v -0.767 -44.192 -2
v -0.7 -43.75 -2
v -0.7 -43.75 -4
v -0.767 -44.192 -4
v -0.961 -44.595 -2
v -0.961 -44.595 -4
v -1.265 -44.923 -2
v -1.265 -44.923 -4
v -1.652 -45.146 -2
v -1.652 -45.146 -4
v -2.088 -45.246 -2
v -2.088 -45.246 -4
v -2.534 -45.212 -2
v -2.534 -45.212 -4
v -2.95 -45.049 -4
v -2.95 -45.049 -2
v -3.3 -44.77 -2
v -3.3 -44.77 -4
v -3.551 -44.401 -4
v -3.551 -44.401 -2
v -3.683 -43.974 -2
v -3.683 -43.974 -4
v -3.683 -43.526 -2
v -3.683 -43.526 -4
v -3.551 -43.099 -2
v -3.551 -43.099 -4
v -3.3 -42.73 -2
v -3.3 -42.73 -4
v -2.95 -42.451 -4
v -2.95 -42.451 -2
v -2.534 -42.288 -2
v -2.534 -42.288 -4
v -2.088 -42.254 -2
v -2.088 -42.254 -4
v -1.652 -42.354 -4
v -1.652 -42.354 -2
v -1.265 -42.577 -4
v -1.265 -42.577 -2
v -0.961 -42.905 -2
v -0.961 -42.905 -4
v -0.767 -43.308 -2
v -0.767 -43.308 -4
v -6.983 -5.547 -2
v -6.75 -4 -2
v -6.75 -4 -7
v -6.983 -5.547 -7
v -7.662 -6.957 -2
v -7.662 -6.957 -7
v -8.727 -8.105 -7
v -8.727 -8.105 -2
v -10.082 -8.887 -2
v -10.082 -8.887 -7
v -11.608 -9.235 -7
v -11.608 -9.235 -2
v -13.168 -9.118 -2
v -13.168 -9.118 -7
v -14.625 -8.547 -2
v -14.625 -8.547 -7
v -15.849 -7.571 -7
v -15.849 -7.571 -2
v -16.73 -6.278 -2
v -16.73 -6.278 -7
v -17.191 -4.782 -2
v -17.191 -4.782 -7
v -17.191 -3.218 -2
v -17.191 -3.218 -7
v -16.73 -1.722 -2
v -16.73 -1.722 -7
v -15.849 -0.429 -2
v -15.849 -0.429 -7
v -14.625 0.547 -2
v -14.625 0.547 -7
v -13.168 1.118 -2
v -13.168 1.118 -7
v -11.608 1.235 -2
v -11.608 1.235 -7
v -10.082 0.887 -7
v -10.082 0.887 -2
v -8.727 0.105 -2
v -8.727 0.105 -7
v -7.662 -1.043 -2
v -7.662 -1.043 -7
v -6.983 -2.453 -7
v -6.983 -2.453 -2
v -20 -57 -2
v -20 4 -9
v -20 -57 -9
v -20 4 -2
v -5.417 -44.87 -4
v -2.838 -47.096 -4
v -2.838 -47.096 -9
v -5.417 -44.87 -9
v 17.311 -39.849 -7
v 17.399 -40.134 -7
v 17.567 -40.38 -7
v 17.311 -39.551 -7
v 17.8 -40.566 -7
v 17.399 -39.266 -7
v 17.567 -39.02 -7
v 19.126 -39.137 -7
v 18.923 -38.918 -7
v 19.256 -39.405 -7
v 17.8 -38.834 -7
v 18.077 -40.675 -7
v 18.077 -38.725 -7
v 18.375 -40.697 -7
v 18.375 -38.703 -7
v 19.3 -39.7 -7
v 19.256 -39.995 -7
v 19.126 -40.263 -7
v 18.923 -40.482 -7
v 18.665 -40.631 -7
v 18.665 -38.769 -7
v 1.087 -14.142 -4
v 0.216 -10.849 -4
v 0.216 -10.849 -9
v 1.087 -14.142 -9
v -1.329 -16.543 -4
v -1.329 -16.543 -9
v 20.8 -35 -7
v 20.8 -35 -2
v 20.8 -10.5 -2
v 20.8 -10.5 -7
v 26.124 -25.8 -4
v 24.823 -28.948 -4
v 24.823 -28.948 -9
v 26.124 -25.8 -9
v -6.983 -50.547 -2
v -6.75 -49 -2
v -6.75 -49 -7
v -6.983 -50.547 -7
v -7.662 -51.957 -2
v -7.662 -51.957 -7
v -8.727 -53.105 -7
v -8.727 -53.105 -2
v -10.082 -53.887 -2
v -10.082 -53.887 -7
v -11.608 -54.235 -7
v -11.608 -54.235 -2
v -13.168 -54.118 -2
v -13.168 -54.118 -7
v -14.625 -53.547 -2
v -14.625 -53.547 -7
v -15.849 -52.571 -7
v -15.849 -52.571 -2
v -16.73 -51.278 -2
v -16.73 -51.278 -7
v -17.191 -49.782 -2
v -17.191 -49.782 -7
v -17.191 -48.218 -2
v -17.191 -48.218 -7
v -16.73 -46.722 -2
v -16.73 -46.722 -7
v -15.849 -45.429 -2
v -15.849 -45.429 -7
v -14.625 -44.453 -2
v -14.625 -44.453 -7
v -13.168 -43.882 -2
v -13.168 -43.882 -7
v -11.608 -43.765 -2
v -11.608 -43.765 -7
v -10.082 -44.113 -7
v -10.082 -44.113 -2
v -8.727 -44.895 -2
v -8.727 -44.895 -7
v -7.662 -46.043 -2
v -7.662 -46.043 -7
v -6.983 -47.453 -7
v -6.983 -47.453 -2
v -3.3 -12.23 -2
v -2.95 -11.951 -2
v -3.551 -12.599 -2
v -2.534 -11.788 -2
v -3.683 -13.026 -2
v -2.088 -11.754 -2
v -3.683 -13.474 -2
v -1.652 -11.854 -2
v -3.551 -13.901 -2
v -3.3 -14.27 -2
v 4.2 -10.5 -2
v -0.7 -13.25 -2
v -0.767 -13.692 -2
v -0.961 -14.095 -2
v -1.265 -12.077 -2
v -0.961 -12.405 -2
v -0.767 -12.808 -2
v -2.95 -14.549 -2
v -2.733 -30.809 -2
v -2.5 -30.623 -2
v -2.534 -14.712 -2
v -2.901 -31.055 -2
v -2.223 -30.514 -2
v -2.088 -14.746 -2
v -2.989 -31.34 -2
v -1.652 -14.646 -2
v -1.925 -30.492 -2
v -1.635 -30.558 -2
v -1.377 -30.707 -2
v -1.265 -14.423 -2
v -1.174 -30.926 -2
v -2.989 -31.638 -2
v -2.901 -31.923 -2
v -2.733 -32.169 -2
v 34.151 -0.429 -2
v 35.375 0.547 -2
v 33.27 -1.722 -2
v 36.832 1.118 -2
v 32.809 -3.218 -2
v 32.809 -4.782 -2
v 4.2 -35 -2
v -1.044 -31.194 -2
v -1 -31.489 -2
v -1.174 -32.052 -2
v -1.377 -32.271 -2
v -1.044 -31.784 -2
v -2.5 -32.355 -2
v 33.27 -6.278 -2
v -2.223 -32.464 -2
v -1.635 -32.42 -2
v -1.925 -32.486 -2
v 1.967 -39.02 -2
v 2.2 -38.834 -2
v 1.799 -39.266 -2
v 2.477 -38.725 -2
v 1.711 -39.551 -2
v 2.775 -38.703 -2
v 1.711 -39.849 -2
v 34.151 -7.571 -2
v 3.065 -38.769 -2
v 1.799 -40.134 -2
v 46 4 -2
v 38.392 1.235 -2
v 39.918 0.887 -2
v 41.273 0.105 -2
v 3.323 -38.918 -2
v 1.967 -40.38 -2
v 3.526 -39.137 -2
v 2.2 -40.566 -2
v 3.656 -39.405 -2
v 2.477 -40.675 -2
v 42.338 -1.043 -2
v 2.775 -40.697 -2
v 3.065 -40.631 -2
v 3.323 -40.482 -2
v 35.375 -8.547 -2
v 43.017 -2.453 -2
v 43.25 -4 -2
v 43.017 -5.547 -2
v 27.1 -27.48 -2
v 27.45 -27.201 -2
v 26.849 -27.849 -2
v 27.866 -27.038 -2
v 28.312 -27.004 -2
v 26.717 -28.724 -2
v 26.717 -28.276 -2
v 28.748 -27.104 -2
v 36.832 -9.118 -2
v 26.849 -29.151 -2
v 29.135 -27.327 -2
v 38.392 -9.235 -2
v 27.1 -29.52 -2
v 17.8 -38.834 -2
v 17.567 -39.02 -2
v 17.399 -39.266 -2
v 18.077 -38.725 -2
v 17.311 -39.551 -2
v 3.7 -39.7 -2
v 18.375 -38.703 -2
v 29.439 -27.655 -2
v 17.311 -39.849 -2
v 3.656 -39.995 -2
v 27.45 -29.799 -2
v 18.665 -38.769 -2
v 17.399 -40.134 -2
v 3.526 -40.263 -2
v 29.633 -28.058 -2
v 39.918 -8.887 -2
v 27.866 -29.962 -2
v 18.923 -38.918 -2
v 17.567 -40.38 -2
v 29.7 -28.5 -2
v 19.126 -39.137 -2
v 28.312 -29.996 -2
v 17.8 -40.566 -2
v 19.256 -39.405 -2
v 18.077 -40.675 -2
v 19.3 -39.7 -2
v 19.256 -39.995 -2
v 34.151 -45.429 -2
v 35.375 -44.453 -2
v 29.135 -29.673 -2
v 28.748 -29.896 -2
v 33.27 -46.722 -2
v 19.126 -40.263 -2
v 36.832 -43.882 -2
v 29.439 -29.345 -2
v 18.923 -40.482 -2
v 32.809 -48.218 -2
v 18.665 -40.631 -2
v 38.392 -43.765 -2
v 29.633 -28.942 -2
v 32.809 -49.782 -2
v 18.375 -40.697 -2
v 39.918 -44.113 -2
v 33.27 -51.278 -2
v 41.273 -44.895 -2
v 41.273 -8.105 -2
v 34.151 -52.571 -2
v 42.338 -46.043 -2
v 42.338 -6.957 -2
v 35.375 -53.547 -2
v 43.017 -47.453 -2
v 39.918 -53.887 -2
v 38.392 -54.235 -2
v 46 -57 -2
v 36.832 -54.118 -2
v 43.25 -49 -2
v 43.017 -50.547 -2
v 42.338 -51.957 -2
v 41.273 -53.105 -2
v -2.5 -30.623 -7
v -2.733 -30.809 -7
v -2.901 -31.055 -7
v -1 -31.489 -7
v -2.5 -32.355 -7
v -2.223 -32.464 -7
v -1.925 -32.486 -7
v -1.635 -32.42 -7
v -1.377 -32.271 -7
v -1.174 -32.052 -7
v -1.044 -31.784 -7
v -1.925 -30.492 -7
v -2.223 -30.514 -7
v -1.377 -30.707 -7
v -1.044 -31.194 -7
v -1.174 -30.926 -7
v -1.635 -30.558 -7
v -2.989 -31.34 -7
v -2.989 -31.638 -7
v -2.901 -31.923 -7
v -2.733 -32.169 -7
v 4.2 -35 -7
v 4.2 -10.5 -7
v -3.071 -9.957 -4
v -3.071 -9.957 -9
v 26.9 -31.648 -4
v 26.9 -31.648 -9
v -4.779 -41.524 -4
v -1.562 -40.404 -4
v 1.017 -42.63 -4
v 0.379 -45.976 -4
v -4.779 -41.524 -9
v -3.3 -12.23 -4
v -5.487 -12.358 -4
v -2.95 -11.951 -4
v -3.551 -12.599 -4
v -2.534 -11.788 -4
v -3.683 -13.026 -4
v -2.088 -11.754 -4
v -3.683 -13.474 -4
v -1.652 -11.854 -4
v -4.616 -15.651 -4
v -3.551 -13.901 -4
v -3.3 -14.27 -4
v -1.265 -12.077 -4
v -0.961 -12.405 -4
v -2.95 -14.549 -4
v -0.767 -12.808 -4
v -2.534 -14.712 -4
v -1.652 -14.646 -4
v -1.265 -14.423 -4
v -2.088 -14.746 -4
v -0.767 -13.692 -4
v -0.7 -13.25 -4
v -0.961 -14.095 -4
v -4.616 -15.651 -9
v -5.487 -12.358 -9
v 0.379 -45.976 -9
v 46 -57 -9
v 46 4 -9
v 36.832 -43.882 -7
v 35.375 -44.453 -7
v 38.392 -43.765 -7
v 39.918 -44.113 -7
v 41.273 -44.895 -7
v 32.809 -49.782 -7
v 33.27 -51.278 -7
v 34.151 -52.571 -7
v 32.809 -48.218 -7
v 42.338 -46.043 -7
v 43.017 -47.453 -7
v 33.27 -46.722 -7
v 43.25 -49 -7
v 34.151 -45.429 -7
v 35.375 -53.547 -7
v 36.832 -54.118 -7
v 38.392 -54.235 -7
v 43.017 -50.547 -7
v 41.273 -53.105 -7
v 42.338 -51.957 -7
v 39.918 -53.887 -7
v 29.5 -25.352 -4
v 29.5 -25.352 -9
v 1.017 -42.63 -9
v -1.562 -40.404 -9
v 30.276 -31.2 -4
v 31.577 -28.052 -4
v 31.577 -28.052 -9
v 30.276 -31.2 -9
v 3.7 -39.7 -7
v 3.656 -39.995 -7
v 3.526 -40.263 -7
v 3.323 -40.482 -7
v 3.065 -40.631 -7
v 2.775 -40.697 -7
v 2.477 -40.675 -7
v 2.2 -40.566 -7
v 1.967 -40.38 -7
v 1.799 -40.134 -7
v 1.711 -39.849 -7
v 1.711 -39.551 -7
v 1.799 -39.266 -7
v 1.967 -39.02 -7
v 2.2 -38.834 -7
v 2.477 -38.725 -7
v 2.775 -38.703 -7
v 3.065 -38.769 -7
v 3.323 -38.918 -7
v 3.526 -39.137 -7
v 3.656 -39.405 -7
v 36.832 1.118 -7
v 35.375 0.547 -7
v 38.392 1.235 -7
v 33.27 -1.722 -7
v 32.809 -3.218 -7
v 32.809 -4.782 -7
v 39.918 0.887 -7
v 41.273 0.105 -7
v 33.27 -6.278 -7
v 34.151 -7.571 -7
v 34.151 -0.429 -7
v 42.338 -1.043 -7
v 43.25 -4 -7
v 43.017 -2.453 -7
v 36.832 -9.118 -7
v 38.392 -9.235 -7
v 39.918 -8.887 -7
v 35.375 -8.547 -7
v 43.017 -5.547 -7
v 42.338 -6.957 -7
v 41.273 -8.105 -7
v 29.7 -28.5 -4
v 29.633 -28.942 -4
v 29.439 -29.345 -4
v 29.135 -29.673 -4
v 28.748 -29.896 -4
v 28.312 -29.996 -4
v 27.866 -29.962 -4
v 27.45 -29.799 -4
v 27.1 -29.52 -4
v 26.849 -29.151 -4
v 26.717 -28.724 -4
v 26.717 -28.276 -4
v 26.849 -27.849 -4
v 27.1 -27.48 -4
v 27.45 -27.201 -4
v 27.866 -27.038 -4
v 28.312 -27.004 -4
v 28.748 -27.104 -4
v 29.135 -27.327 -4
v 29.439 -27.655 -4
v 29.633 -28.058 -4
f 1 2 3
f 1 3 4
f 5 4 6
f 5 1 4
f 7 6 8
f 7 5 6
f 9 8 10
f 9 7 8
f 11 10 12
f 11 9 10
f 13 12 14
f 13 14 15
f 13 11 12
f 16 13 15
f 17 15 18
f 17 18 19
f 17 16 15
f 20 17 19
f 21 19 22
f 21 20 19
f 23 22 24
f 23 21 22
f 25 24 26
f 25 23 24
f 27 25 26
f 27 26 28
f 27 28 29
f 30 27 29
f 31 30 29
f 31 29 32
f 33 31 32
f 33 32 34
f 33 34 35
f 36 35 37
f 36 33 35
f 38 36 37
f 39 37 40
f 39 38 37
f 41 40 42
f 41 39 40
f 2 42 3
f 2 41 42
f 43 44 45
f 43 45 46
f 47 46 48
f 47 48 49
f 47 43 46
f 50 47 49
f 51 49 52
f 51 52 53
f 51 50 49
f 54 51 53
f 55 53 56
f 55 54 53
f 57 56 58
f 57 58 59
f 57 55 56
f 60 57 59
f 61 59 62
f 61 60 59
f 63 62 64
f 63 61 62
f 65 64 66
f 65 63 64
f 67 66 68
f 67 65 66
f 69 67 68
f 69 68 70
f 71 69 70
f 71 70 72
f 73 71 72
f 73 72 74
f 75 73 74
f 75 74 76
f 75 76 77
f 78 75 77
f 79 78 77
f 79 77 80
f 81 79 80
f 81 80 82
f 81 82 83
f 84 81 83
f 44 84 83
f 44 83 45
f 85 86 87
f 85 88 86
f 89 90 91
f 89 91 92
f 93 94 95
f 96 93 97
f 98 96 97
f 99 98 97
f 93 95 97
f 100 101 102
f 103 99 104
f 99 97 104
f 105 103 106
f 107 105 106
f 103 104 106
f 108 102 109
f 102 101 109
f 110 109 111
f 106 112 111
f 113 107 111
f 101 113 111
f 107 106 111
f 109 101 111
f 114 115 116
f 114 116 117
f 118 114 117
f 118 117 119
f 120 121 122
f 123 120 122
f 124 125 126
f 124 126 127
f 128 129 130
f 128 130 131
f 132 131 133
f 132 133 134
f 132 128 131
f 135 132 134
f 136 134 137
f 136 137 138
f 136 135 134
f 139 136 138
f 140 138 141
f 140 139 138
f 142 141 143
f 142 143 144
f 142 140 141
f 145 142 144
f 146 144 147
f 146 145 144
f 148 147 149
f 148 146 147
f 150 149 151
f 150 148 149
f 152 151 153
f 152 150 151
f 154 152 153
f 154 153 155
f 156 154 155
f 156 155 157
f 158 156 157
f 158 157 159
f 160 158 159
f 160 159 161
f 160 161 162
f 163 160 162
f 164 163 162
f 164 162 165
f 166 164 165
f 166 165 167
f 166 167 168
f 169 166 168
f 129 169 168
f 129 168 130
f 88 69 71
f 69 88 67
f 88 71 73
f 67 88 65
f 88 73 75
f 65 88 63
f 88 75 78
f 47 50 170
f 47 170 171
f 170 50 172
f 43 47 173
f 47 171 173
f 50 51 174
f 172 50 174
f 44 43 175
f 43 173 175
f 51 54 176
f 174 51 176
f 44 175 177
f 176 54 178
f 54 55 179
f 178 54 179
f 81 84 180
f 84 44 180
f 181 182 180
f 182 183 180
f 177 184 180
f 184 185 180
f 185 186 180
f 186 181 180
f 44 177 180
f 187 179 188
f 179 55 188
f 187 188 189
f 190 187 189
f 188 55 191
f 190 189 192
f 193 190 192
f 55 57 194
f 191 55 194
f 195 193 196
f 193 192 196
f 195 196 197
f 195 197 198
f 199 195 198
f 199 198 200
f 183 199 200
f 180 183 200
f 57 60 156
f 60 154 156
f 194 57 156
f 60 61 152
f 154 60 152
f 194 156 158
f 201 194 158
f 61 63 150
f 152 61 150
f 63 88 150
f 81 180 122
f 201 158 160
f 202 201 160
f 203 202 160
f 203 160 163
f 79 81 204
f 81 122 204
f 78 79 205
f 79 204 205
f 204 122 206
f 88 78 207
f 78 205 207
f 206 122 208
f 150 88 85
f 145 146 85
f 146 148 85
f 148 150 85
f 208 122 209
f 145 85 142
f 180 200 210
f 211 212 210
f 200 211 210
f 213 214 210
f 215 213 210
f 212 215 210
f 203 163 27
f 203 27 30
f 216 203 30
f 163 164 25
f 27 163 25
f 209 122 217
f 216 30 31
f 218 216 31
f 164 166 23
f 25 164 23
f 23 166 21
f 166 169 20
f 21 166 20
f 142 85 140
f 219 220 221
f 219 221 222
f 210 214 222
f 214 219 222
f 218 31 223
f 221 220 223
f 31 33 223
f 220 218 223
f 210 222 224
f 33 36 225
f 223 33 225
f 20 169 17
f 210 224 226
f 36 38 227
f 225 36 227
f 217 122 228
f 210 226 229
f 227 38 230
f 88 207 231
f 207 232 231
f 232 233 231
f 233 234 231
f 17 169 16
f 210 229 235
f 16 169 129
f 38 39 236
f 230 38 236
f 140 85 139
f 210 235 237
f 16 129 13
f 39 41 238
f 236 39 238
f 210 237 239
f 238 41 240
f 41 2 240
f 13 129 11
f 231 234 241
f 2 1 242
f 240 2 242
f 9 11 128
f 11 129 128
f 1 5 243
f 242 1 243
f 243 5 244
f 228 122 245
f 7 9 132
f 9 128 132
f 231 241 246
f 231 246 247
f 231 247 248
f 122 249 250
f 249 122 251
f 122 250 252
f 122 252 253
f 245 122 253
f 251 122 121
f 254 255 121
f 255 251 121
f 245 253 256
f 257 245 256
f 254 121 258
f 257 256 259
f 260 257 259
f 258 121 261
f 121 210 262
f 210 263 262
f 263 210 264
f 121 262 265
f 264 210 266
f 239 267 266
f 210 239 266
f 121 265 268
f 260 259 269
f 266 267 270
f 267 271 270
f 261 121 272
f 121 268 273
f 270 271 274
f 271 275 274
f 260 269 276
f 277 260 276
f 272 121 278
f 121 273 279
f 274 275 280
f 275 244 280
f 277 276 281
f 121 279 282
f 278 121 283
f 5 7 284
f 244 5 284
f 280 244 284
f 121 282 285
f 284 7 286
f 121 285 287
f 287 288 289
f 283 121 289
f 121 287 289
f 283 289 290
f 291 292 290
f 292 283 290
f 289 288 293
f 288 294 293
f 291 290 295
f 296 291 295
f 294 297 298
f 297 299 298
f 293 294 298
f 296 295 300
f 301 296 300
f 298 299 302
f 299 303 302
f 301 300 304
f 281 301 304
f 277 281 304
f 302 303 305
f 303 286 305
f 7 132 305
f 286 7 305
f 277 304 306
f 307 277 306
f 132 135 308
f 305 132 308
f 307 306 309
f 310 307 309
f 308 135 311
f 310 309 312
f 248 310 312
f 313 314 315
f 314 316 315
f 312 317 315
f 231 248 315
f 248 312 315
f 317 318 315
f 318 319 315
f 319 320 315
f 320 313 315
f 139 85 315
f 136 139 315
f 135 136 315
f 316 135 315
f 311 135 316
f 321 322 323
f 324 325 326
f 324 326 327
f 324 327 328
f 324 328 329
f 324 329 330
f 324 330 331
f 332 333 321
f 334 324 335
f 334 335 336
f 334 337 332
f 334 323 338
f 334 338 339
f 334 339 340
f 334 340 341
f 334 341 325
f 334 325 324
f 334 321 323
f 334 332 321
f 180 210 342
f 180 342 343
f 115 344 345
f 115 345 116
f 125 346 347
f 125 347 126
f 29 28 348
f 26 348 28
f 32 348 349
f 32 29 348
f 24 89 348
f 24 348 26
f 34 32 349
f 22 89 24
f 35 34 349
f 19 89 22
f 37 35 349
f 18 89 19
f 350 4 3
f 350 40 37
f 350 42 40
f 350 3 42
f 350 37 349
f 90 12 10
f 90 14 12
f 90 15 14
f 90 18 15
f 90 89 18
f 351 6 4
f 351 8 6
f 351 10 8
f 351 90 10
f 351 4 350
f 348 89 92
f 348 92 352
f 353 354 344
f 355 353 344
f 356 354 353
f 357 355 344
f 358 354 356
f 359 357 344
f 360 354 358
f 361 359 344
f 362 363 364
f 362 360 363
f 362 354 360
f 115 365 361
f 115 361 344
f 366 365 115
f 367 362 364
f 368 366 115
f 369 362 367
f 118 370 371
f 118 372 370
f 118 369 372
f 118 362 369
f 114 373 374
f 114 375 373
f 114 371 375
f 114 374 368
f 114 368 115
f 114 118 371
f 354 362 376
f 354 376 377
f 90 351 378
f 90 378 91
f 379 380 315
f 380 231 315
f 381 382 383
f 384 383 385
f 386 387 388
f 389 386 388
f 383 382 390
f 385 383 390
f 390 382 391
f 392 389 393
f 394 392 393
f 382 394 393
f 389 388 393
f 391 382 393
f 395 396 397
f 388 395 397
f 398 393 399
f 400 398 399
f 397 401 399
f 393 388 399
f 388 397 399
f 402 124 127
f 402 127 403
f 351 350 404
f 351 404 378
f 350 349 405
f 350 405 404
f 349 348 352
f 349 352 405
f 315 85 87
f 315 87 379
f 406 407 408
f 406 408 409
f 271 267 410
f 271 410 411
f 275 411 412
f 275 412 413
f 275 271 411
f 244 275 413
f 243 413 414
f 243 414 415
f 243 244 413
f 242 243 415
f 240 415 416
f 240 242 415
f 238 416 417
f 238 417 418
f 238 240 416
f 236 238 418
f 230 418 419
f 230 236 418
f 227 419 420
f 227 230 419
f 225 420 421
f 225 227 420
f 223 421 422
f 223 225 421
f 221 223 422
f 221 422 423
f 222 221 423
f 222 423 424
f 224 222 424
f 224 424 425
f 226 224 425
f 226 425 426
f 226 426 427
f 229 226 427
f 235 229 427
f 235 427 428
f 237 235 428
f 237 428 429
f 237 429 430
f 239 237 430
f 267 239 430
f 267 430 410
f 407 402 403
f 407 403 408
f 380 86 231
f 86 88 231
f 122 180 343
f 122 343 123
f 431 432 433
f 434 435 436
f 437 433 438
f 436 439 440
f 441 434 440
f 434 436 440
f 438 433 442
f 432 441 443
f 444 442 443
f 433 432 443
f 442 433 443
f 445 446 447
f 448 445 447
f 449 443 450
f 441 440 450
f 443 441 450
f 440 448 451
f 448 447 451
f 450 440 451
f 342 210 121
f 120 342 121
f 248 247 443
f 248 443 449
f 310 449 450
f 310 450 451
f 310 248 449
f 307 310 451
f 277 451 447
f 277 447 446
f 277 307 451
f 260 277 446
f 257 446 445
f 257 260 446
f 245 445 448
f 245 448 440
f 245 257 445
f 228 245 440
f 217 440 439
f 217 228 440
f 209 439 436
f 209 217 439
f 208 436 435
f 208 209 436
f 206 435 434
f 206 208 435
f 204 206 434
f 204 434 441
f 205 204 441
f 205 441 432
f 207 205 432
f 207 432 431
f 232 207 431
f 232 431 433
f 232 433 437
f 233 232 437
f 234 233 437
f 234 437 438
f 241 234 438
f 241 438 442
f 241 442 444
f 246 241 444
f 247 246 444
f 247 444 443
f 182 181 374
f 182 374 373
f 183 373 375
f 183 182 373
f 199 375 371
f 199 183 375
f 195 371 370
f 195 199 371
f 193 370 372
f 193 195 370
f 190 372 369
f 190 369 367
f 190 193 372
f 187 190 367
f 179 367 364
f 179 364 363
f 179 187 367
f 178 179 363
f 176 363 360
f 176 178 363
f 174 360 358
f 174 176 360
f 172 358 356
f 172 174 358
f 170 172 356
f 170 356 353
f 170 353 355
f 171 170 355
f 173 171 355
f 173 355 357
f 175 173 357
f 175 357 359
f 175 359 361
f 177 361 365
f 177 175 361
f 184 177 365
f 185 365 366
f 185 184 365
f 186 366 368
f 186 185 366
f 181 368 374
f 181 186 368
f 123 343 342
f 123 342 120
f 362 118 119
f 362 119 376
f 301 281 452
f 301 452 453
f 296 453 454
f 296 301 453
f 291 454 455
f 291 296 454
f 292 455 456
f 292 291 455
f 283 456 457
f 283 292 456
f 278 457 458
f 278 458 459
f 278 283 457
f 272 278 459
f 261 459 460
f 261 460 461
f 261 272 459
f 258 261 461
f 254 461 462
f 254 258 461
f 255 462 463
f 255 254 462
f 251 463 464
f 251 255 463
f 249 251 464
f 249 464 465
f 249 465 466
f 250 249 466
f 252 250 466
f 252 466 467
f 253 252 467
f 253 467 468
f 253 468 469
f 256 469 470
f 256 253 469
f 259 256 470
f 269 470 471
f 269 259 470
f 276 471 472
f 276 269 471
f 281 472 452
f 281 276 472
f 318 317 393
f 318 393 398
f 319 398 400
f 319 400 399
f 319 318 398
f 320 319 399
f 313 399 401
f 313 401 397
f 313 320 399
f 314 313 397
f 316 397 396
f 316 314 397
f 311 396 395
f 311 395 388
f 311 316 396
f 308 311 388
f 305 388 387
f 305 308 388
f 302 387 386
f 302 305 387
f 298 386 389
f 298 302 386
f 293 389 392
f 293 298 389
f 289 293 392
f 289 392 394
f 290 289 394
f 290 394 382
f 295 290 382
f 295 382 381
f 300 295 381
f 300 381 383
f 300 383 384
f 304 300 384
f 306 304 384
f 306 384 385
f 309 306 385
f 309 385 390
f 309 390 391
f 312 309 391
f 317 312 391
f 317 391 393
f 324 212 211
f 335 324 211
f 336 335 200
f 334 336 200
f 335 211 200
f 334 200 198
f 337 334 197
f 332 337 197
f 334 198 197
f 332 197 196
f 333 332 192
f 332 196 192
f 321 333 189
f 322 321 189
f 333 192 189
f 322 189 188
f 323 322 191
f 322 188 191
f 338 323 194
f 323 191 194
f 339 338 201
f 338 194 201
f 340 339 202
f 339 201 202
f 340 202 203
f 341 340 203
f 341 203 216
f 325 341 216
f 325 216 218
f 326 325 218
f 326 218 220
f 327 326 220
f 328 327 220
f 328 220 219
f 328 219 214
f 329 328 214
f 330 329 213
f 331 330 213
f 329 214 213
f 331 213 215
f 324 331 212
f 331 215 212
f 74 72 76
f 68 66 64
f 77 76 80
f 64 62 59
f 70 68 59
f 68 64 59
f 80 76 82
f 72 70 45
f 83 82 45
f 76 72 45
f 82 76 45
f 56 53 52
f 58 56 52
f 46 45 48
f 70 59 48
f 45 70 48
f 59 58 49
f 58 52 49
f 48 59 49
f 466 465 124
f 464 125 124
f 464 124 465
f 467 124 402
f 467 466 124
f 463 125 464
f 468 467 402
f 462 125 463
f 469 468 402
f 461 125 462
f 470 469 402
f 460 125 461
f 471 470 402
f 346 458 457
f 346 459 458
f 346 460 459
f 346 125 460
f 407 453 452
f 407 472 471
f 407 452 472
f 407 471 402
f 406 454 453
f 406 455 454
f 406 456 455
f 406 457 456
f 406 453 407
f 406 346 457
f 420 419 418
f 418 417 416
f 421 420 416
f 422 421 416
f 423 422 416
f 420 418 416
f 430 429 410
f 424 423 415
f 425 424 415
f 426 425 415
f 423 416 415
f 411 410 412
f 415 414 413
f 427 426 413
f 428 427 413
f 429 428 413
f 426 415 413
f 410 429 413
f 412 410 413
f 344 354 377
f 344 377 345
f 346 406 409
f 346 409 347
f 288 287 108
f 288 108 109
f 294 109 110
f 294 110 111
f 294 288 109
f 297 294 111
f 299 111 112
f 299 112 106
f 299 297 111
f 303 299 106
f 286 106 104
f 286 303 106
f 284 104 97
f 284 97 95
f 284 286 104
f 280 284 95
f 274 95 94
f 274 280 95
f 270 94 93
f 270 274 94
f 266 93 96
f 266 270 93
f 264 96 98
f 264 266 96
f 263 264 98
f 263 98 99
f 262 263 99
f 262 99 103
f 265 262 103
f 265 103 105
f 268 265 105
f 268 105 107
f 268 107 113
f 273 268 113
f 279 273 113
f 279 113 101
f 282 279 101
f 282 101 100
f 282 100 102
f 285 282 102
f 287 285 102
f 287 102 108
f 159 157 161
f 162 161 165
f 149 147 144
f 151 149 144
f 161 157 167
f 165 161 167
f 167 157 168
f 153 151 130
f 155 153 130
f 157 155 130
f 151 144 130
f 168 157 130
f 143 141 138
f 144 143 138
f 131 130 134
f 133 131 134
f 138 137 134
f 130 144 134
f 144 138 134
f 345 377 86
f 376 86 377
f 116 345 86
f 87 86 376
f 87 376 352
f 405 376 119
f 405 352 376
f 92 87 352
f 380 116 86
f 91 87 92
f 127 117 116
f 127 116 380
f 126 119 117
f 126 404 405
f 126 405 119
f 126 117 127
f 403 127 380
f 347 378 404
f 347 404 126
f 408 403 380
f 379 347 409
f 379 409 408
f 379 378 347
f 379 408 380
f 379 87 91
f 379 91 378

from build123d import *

# Parameters (mm, degrees)
SKETCH023_W     = 66
SKETCH023_H     = 61
SKETCH023_R     = 1.5
SKETCH023_R_2   = 1
SKETCH023_R_3   = 5.25
PAD016_DEPTH    = 2
SKETCH025_W     = 66
SKETCH025_H     = 61
PAD017_DEPTH    = 5
SKETCH024_R     = 5.25
SKETCH024_R_2   = 1
POCKET006_DEPTH = 3
SKETCH026_W     = 16.6
SKETCH026_H     = 24.5
POCKET007_DEPTH = 5
SKETCH029_R     = 1
POCKET009_DEPTH = 5


with BuildPart() as part:
    # Sketch023 (on DatumPlane) → Pad016 (new body)
    with BuildSketch(Plane(origin=(0, 0, -2), x_dir=(1, 0, 0), z_dir=(0, 0, -1))):
        with Locations((13, 26.5)):
            Rectangle(SKETCH023_W, SKETCH023_H)
        with Locations((-2.2, 43.75)):
            Circle(SKETCH023_R, mode=Mode.SUBTRACT)
        with Locations((2.7, 39.7)):
            Circle(SKETCH023_R_2, mode=Mode.SUBTRACT)
        with Locations((18.3, 39.7)):
            Circle(SKETCH023_R_2, mode=Mode.SUBTRACT)
        with Locations((28.2, 28.5)):
            Circle(SKETCH023_R, mode=Mode.SUBTRACT)
        with Locations((-2.2, 13.25)):
            Circle(SKETCH023_R, mode=Mode.SUBTRACT)
        with Locations((-12, 49)):
            Circle(SKETCH023_R_3, mode=Mode.SUBTRACT)
        with Locations((38, 49)):
            Circle(SKETCH023_R_3, mode=Mode.SUBTRACT)
        with Locations((-12, 4)):
            Circle(SKETCH023_R_3, mode=Mode.SUBTRACT)
        with Locations((38, 4)):
            Circle(SKETCH023_R_3, mode=Mode.SUBTRACT)
    extrude(amount=PAD016_DEPTH)

    # Sketch025 (on Face15 of Pad016) → Pad017 (join)
    with BuildSketch(Plane(origin=(0, 0, -4), x_dir=(1, 0, 0), z_dir=(0, 0, -1))):
        with Locations((13, 26.5)):
            Rectangle(SKETCH025_W, SKETCH025_H)
        Polygon((-2.838178, 47.096052), (-5.416855, 44.870347), (-4.778677, 41.524295), (-1.561822, 40.403948), (1.016855, 42.629653), (0.378677, 45.975705), align=None, mode=Mode.SUBTRACT)
        Polygon((29.500297, 25.351578), (31.576762, 28.051879), (30.276465, 31.200301), (26.899703, 31.648422), (24.823238, 28.948121), (26.123535, 25.799699), align=None, mode=Mode.SUBTRACT)
        Polygon((1.087429, 14.142269), (-1.329013, 16.543131), (-4.616442, 15.650863), (-5.487429, 12.357731), (-3.070987, 9.956869), (0.216442, 10.849137), align=None, mode=Mode.SUBTRACT)
    extrude(amount=PAD017_DEPTH)

    # Sketch024 (on Face15 of Pad016) → Pocket006 (cut)
    with BuildSketch(Plane(origin=(0, 0, -4), x_dir=(1, 0, 0), z_dir=(0, 0, -1))):
        with Locations((-12, 4)):
            Circle(SKETCH024_R)
        with Locations((-12, 49)):
            Circle(SKETCH024_R)
        with Locations((38, 49)):
            Circle(SKETCH024_R)
        with Locations((38, 4)):
            Circle(SKETCH024_R)
        with Locations((2.7, 39.7)):
            Circle(SKETCH024_R_2)
        with Locations((18.3, 39.7)):
            Circle(SKETCH024_R_2)
    extrude(amount=POCKET006_DEPTH, mode=Mode.SUBTRACT)

    # Sketch026 (on Face4 of Pocket006) → Pocket007 (cut)
    with BuildSketch(Plane.XY.offset(-2)):
        with Locations((12.5, -22.75)):
            Rectangle(SKETCH026_W, SKETCH026_H)
    extrude(amount=-POCKET007_DEPTH, mode=Mode.SUBTRACT)

    # Sketch029 (on Face4 of Pocket007) → Pocket009 (cut)
    with BuildSketch(Plane.XY.offset(-2)):
        with Locations((-2, -31.489113)):
            Circle(SKETCH029_R)
    extrude(amount=-POCKET009_DEPTH, mode=Mode.SUBTRACT)


solid = part.part
